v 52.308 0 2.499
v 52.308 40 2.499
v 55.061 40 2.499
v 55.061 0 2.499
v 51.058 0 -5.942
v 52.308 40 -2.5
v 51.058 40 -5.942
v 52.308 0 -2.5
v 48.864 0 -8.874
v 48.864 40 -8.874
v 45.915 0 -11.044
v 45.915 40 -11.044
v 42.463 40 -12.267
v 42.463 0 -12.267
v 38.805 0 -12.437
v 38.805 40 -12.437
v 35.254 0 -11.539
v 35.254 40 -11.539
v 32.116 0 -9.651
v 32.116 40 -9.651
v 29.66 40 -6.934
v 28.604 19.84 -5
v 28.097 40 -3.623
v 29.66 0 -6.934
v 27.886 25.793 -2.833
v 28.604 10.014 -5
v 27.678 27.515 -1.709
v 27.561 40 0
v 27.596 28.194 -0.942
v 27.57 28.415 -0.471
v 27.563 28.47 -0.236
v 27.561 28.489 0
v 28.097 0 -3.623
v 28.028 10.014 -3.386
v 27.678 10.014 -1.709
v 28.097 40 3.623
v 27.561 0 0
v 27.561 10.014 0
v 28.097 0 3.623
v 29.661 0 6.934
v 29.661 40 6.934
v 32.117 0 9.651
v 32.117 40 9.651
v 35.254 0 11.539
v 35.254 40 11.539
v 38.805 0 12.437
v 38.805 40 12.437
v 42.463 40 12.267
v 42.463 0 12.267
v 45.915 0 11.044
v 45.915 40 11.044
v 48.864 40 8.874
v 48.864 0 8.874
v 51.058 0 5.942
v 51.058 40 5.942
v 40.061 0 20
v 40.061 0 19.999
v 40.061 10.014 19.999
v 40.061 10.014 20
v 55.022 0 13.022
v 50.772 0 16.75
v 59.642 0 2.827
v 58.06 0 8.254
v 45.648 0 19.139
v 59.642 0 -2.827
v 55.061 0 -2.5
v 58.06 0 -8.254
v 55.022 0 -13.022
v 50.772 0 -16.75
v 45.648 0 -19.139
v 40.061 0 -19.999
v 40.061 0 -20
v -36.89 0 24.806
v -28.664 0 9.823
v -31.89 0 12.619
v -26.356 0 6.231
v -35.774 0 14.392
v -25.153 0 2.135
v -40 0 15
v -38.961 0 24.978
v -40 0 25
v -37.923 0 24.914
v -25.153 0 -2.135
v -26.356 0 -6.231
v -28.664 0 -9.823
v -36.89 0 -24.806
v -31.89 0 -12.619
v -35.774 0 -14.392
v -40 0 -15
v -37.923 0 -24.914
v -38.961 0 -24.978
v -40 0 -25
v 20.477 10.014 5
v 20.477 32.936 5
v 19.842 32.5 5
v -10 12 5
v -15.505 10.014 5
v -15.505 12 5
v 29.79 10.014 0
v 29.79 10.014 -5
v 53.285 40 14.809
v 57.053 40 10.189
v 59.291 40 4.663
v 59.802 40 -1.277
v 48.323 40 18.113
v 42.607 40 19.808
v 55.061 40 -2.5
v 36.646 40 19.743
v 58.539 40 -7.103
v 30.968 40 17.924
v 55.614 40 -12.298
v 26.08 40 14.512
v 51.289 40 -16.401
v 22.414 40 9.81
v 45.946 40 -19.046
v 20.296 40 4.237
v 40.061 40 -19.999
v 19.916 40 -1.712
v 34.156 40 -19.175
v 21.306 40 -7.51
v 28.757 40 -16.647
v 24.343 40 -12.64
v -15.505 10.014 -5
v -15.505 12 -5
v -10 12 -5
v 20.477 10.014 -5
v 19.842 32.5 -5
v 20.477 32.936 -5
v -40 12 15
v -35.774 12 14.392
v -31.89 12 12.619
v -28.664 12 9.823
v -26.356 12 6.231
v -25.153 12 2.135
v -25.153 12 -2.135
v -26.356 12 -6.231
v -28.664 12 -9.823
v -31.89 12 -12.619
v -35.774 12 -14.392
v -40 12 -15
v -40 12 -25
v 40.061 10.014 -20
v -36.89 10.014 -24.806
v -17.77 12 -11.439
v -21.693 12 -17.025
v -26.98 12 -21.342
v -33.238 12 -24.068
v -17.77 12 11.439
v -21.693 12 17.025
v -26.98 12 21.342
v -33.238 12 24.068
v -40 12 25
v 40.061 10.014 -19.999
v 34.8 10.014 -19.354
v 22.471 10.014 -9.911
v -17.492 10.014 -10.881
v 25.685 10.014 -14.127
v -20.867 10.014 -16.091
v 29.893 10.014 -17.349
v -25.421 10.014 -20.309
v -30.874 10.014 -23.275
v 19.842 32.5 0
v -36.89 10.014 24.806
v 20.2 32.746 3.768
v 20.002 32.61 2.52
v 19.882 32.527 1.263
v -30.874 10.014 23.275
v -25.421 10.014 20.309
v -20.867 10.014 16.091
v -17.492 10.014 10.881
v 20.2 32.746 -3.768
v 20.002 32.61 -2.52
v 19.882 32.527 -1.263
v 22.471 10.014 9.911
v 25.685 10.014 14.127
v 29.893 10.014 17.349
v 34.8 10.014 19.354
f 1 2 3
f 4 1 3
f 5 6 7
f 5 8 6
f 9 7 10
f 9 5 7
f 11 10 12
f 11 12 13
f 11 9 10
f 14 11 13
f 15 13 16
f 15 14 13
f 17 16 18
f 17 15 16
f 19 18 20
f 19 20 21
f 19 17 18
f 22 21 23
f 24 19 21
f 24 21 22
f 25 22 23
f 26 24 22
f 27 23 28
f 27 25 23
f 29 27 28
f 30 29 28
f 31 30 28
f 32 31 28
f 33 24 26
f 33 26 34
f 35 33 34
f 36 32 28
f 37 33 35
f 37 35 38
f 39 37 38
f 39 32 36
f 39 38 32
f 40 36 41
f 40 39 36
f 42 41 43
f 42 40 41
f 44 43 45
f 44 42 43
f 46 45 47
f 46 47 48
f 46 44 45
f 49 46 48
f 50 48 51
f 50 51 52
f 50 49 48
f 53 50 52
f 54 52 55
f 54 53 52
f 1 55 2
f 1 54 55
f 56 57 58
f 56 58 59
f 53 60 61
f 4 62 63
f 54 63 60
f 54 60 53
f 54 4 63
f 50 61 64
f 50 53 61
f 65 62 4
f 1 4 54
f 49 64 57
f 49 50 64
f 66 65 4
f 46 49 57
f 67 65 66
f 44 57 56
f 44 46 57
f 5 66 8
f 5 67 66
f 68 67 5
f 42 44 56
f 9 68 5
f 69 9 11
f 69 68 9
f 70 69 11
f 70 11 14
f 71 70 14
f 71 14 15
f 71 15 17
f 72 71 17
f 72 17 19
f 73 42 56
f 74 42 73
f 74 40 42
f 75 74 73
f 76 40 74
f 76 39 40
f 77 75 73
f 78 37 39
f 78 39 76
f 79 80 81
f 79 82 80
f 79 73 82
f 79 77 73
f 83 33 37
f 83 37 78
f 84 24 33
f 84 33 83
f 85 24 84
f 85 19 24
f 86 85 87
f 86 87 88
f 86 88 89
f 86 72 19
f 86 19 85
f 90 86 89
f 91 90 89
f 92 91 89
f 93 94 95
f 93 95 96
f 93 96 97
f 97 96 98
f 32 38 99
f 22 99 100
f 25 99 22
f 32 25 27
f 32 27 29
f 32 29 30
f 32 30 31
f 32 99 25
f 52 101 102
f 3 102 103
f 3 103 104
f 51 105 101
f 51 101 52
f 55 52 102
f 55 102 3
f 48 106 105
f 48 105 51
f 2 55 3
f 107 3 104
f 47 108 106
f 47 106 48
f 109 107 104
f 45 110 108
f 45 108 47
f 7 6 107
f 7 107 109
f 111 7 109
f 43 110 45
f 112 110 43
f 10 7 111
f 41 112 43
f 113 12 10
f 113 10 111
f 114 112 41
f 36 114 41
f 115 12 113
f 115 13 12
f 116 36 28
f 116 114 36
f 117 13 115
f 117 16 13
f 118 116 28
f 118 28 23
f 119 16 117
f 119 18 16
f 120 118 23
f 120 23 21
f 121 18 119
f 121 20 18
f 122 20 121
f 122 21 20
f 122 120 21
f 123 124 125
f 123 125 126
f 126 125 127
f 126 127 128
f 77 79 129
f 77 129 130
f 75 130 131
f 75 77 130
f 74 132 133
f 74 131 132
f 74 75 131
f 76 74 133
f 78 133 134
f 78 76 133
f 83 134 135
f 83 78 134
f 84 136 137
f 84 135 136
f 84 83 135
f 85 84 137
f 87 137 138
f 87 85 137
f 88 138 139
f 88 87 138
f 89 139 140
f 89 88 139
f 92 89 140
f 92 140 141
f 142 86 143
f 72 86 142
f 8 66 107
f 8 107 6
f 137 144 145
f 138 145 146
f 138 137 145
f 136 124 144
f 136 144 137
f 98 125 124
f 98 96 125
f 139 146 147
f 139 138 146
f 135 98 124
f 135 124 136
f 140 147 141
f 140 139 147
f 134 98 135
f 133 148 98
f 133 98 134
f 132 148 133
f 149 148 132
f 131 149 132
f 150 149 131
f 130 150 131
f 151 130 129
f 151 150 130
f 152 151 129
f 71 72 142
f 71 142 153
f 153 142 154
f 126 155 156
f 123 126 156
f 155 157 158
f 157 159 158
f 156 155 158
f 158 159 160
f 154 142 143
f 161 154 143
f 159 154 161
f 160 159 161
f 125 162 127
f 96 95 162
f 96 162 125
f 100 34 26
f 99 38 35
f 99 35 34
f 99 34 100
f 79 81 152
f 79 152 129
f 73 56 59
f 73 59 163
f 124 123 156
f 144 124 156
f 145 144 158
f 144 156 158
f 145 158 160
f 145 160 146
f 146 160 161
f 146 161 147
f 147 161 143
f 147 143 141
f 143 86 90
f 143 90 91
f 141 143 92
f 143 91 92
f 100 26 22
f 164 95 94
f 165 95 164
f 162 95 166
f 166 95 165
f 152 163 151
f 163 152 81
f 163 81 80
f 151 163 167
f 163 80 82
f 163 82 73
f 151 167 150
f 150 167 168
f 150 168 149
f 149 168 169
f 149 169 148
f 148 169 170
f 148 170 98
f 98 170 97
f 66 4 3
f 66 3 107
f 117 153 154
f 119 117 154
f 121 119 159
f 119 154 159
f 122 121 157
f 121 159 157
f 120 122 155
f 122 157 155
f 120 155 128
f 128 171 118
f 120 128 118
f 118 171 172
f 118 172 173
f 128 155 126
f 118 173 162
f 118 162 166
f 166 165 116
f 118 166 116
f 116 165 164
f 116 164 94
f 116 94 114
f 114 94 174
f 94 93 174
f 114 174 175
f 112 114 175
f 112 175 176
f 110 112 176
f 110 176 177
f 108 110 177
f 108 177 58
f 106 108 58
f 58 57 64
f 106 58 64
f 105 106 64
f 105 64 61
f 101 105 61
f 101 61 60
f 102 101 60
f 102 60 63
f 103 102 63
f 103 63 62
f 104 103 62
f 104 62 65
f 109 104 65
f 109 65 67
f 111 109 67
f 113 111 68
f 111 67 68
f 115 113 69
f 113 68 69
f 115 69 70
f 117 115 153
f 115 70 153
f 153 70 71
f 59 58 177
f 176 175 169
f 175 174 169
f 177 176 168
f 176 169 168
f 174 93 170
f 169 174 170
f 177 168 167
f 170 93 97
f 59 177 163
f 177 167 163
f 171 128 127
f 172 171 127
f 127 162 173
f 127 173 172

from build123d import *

# Parameters (mm, degrees)
BOSS_EXTRUDE2_DEPTH = 10.01387566
BOSS_EXTRUDE3_DEPTH = 12
SKETCH18_R          = 20
BOSS_EXTRUDE6_DEPTH = 40
SKETCH26_R          = 12.5
CUT_EXTRUDE2_DEPTH  = 40
CUT_EXTRUDE5_DEPTH  = 40
BOSS_EXTRUDE8_DEPTH = 5
BOSS_EXTRUDE9_DEPTH = 5


with BuildPart() as part:
    # Sketch1 → Boss-Extrude2 (new body)
    with BuildSketch(Plane(origin=(0, 0, 0), x_dir=(1, 0, 0), z_dir=(0, 1, 0))):
        with BuildLine():
            Line((-40, -25), (-40, -15))
            ThreePointArc((-40, -15), (-25, 0), (-40, 15))
            Line((-40, 15), (-40, 25))
            Line((-40, 25), (40.060765138, 20))
            Line((40.060765138, 20), (40.060765138, -20))
            Line((40.060765138, -20), (-40, -25))
        make_face()
    extrude(amount=BOSS_EXTRUDE2_DEPTH)

    # Sketch17 → Boss-Extrude3 (add)
    with BuildSketch(Plane(origin=(0, 0, 0), x_dir=(1, 0, 0), z_dir=(0, 1, 0))):
        with BuildLine():
            Line((-40, 25), (-40, 15))
            ThreePointArc((-40, 15), (-25, 0), (-40, -15))
            Line((-40, -15), (-40, -25))
            ThreePointArc((-40, -25), (-15, 0), (-40, 25))
        make_face()
    extrude(amount=BOSS_EXTRUDE3_DEPTH)

    # Sketch18 → Boss-Extrude6 (add)
    with BuildSketch(Plane(origin=(0, 0, 0), x_dir=(1, 0, 0), z_dir=(0, 1, 0))):
        with Locations(Location((39.84238711, 0, 0), (0, 0, 89.374380602))):
            Circle(SKETCH18_R)
    extrude(amount=BOSS_EXTRUDE6_DEPTH)

    # Sketch26 → Cut-Extrude2 (cut)
    with BuildSketch(Plane(origin=(0, 0, 0), x_dir=(1, 0, 0), z_dir=(0, 1, 0))):
        with Locations(Location((40.060765138, 0, 0), (0, 0, 270))):
            Circle(SKETCH26_R)
    extrude(amount=CUT_EXTRUDE2_DEPTH, mode=Mode.SUBTRACT)

    # Sketch27 → Cut-Extrude5 (cut)
    with BuildSketch(Plane(origin=(0, 0, 0), x_dir=(1, 0, 0), z_dir=(0, 1, 0))):
        with BuildLine():
            Line((55.060765138, 2.499608634), (52.235862007, 2.499608634))
            ThreePointArc((52.235862007, 2.499608634), (52.426066383, 1.256530998), (52.489684933, 0.00059613))
            ThreePointArc((52.489684933, 0.00059613), (52.426015439, -1.255840203), (52.235659276, -2.49940387))
            Line((52.235659276, -2.49940387), (55.060765138, -2.49940387))
            Line((55.060765138, -2.49940387), (55.060765138, 0.00059613))
            Line((55.060765138, 0.00059613), (55.060765138, 2.499608634))
        make_face()
    extrude(amount=CUT_EXTRUDE5_DEPTH, mode=Mode.SUBTRACT)

    # Sketch35 → Boss-Extrude8 (add)
    with BuildSketch(Plane.XY):
        Polygon((-15, 12), (-10, 12), (19.84238711, 32.5), (25.015627371, 36.053717903), (26.363273424, 32.5), (25.450319422, 10.01387566), (19.84238711, 10.01387566), (-15, 10.01387566), (-18.557885477, 10.01387566), (-18.07381102, 12), align=None)
    extrude(amount=BOSS_EXTRUDE8_DEPTH)

    # Sketch41 → Boss-Extrude9 (add)
    with BuildSketch(Plane.XY):
        Polygon((19.84238711, 32.5), (-10, 12), (-16.624555897, 12), (-16.624555897, 10.01387566), (29.789890708, 10.01387566), (27.477800575, 29.176181785), (25.597486792, 36.45342179), align=None)
    extrude(amount=-BOSS_EXTRUDE9_DEPTH)


solid = part.part
